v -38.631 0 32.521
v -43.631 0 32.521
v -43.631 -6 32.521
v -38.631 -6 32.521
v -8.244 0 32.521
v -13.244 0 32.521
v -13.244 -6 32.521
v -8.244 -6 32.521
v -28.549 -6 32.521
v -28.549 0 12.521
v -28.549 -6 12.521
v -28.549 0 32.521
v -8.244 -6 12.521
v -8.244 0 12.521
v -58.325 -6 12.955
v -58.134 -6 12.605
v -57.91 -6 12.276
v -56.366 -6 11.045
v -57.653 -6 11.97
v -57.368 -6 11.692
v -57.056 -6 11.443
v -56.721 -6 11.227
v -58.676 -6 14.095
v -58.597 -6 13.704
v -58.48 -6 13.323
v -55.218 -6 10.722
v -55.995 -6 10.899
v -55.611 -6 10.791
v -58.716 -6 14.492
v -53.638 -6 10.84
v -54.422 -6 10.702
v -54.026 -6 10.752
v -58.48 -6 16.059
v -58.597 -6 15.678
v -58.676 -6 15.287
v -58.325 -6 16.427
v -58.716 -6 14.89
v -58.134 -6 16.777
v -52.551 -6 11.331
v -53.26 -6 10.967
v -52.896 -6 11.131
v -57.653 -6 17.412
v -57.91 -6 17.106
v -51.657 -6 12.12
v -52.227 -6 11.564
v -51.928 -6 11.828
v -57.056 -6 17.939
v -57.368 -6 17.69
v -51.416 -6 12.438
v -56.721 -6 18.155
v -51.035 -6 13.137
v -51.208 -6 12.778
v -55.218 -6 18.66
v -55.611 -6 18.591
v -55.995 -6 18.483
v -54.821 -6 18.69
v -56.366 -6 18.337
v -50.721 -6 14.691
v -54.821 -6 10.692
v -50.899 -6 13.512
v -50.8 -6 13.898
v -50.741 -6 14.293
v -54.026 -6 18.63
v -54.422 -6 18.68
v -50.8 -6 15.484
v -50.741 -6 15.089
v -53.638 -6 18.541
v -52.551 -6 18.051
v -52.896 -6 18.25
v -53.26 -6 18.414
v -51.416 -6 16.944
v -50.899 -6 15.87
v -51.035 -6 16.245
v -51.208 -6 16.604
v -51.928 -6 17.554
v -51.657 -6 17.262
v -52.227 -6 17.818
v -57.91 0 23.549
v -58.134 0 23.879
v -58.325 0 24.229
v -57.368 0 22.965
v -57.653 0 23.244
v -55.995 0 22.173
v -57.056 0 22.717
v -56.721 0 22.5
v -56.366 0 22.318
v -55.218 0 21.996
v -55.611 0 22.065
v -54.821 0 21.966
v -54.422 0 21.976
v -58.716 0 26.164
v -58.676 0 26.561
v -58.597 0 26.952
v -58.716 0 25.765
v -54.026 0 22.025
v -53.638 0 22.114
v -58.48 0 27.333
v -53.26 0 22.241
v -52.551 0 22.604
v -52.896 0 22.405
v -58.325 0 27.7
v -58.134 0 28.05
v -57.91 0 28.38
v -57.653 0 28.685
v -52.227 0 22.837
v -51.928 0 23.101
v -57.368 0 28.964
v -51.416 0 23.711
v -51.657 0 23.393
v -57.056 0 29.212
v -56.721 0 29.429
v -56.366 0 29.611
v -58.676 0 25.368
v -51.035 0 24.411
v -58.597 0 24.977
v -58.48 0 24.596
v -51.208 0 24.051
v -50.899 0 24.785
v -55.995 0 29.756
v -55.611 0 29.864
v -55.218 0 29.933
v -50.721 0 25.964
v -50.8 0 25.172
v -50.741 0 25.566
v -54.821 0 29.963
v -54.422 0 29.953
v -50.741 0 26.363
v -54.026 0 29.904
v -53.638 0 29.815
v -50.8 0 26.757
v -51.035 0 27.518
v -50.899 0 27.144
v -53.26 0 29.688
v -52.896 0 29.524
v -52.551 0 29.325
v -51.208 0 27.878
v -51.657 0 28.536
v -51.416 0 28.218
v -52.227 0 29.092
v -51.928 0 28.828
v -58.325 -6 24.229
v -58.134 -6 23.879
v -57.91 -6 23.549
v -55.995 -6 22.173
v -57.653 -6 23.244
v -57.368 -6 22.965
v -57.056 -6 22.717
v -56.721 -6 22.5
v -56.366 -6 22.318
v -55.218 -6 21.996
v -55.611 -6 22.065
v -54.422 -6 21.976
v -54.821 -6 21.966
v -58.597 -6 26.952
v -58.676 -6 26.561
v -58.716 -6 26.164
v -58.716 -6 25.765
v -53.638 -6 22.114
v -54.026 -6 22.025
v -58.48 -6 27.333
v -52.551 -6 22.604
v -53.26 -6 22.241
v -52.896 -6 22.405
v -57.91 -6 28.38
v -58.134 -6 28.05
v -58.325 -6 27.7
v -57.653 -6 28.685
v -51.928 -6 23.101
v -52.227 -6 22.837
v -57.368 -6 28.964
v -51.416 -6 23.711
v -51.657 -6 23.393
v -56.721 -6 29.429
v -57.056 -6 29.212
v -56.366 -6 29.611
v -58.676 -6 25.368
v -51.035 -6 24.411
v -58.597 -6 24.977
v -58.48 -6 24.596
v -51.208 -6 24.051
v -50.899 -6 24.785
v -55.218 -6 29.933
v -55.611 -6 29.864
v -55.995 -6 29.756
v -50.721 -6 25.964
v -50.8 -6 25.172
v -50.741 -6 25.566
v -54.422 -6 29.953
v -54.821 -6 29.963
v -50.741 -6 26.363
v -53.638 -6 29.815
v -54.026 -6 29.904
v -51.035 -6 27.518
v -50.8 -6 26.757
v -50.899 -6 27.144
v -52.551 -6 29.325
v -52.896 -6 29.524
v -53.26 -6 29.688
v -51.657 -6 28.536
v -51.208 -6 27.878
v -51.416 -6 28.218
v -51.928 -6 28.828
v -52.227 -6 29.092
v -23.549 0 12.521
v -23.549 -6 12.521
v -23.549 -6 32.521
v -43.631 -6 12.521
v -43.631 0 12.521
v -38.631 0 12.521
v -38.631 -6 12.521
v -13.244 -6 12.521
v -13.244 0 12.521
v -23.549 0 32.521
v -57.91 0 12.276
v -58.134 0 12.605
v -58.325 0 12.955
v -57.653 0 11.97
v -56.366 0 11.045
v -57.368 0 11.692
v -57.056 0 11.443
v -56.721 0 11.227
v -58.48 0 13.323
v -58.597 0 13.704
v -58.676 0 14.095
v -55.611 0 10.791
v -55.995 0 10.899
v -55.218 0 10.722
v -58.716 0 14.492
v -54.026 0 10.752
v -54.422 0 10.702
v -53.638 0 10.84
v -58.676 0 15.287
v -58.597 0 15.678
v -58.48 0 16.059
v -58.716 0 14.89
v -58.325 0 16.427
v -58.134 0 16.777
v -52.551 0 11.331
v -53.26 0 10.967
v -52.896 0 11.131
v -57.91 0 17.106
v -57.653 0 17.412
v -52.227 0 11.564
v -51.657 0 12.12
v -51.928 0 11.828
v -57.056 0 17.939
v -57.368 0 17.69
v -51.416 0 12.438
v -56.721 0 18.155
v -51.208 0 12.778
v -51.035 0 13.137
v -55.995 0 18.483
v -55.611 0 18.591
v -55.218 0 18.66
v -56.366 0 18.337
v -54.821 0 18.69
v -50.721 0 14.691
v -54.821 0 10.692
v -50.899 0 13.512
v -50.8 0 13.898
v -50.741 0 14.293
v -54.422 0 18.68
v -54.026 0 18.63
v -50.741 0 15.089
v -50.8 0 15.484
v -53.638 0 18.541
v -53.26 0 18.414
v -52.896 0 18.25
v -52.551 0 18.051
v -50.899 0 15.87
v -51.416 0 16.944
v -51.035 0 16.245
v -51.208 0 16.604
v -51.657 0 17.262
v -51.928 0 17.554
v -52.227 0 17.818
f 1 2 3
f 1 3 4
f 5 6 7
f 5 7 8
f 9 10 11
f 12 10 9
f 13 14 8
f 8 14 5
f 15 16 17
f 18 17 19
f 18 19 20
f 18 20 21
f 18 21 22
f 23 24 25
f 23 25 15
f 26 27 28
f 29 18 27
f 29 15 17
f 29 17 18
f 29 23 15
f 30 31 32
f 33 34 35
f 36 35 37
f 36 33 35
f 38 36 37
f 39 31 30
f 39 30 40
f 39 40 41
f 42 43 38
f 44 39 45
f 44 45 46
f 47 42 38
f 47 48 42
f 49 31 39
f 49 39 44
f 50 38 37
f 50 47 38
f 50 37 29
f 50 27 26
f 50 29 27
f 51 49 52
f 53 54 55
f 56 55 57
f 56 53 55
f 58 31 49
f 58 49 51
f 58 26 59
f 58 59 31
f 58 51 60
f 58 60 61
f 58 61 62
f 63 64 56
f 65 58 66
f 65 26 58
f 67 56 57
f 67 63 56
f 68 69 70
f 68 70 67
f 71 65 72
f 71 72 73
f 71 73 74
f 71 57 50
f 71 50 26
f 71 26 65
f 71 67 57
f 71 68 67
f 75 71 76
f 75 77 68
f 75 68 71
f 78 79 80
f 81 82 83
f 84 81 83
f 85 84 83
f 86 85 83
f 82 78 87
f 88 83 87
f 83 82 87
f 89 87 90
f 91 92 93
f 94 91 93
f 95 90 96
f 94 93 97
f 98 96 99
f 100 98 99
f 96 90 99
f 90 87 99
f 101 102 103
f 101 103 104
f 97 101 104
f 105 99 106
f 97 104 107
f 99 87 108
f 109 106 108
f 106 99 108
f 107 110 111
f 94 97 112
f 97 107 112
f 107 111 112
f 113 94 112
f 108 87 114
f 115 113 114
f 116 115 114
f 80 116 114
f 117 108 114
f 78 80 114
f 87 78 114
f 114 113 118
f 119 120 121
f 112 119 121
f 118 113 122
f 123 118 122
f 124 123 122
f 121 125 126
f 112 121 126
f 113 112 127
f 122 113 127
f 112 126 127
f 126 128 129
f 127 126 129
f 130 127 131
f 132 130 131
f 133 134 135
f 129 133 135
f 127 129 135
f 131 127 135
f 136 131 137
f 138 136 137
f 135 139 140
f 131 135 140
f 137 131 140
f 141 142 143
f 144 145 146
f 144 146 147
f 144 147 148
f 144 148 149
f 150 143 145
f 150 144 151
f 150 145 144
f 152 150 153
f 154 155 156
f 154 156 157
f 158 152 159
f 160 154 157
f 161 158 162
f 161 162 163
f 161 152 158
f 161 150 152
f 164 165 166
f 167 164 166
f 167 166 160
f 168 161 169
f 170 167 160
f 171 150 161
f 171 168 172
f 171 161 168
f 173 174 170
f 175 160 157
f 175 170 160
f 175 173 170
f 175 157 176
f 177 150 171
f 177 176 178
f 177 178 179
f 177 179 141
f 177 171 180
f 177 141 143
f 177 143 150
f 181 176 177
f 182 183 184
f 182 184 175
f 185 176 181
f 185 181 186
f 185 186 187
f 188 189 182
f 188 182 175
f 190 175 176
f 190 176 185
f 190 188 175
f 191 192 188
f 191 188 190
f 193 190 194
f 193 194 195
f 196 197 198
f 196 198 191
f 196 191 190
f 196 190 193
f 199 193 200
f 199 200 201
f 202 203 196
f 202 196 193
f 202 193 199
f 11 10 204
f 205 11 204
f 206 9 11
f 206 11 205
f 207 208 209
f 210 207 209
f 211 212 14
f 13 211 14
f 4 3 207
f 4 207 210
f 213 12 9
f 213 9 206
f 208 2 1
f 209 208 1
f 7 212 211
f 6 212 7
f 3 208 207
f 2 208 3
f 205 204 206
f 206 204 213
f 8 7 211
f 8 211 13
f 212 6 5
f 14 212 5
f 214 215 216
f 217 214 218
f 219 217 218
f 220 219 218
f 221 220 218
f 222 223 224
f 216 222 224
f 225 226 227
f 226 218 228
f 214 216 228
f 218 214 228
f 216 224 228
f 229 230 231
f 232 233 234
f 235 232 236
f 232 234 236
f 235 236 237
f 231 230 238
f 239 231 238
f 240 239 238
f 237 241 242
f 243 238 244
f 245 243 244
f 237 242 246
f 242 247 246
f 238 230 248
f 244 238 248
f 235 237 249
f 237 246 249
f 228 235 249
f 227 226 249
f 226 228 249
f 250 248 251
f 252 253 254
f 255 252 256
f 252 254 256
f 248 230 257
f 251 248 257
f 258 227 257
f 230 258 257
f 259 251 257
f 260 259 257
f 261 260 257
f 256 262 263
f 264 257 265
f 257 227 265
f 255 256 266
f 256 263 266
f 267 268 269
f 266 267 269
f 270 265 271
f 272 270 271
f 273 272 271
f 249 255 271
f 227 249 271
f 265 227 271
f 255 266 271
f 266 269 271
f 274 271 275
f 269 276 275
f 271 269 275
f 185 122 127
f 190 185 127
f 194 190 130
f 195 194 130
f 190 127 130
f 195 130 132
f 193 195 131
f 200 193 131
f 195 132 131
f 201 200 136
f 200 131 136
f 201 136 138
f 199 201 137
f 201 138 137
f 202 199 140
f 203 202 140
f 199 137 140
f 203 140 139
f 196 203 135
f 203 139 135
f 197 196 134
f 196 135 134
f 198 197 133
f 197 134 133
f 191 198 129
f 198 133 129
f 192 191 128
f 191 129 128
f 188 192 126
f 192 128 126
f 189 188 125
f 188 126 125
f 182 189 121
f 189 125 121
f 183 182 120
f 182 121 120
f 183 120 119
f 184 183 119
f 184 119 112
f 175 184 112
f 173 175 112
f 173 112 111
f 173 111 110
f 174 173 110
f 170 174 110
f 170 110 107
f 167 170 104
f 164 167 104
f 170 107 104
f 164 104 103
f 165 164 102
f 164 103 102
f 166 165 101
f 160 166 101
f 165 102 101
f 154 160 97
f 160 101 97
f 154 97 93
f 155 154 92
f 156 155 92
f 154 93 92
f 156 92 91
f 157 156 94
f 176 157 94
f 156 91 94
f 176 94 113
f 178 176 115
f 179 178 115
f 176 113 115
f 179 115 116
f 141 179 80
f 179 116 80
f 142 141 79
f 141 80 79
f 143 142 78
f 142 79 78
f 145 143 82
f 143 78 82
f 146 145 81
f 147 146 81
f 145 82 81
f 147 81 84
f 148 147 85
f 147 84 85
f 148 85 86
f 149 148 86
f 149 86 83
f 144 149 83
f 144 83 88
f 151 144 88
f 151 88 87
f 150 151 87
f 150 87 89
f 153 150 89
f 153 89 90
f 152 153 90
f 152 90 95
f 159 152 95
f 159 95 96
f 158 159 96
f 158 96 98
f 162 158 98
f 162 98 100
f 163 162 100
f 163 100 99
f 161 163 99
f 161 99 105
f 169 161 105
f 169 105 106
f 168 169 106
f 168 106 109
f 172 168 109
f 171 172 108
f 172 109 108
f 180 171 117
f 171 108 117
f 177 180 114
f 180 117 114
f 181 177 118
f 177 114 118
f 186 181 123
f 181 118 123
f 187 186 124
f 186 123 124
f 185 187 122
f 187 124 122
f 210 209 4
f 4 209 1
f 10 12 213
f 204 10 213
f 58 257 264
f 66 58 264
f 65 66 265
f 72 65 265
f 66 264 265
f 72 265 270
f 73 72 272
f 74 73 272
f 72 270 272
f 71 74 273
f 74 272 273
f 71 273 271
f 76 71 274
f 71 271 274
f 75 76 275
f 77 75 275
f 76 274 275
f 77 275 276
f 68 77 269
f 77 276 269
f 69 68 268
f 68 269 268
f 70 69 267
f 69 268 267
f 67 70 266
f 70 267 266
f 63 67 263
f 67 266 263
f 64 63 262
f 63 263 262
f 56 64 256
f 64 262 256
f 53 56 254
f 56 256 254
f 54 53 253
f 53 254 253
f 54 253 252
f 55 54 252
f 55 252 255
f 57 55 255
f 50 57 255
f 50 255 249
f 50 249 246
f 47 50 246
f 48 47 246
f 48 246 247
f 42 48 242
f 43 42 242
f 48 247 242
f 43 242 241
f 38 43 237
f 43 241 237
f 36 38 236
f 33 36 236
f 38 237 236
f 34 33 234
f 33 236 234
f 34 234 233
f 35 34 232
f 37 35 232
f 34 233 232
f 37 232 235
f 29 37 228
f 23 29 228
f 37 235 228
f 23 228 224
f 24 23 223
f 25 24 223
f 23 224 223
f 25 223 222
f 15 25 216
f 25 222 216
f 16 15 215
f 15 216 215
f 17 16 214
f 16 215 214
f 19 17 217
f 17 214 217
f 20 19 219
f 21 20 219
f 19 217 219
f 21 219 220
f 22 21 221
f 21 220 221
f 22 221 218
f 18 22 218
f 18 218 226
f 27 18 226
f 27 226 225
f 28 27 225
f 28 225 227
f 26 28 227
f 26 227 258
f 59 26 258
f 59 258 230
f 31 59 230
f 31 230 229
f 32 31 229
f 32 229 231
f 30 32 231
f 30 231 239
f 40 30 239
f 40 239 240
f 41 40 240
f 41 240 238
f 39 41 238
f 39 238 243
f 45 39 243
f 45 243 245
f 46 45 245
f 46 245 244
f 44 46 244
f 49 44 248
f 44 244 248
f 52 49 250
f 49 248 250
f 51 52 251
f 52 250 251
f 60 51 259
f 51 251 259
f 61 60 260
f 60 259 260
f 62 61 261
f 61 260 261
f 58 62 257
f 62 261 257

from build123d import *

# Parameters (mm, degrees)
F0_W     = 5
F0_H     = 20
F0_R     = 4
F1_DEPTH = 6


with BuildPart() as f1:
    # F0 (on Front) → F1 (new body)
    with BuildSketch(Plane.XZ):
        with Locations((-41.131349, 22.520708)):
            Rectangle(F0_W, F0_H)
        with Locations((-54.72108, 25.964499)):
            Circle(F0_R)
        with Locations((-26.049008, 22.520708)):
            Rectangle(F0_W, F0_H)
        with Locations((-10.744237, 22.520708)):
            Rectangle(F0_W, F0_H)
        with Locations((-54.72108, 14.690978)):
            Circle(F0_R)
    extrude(amount=F1_DEPTH)


solid = f1.part
